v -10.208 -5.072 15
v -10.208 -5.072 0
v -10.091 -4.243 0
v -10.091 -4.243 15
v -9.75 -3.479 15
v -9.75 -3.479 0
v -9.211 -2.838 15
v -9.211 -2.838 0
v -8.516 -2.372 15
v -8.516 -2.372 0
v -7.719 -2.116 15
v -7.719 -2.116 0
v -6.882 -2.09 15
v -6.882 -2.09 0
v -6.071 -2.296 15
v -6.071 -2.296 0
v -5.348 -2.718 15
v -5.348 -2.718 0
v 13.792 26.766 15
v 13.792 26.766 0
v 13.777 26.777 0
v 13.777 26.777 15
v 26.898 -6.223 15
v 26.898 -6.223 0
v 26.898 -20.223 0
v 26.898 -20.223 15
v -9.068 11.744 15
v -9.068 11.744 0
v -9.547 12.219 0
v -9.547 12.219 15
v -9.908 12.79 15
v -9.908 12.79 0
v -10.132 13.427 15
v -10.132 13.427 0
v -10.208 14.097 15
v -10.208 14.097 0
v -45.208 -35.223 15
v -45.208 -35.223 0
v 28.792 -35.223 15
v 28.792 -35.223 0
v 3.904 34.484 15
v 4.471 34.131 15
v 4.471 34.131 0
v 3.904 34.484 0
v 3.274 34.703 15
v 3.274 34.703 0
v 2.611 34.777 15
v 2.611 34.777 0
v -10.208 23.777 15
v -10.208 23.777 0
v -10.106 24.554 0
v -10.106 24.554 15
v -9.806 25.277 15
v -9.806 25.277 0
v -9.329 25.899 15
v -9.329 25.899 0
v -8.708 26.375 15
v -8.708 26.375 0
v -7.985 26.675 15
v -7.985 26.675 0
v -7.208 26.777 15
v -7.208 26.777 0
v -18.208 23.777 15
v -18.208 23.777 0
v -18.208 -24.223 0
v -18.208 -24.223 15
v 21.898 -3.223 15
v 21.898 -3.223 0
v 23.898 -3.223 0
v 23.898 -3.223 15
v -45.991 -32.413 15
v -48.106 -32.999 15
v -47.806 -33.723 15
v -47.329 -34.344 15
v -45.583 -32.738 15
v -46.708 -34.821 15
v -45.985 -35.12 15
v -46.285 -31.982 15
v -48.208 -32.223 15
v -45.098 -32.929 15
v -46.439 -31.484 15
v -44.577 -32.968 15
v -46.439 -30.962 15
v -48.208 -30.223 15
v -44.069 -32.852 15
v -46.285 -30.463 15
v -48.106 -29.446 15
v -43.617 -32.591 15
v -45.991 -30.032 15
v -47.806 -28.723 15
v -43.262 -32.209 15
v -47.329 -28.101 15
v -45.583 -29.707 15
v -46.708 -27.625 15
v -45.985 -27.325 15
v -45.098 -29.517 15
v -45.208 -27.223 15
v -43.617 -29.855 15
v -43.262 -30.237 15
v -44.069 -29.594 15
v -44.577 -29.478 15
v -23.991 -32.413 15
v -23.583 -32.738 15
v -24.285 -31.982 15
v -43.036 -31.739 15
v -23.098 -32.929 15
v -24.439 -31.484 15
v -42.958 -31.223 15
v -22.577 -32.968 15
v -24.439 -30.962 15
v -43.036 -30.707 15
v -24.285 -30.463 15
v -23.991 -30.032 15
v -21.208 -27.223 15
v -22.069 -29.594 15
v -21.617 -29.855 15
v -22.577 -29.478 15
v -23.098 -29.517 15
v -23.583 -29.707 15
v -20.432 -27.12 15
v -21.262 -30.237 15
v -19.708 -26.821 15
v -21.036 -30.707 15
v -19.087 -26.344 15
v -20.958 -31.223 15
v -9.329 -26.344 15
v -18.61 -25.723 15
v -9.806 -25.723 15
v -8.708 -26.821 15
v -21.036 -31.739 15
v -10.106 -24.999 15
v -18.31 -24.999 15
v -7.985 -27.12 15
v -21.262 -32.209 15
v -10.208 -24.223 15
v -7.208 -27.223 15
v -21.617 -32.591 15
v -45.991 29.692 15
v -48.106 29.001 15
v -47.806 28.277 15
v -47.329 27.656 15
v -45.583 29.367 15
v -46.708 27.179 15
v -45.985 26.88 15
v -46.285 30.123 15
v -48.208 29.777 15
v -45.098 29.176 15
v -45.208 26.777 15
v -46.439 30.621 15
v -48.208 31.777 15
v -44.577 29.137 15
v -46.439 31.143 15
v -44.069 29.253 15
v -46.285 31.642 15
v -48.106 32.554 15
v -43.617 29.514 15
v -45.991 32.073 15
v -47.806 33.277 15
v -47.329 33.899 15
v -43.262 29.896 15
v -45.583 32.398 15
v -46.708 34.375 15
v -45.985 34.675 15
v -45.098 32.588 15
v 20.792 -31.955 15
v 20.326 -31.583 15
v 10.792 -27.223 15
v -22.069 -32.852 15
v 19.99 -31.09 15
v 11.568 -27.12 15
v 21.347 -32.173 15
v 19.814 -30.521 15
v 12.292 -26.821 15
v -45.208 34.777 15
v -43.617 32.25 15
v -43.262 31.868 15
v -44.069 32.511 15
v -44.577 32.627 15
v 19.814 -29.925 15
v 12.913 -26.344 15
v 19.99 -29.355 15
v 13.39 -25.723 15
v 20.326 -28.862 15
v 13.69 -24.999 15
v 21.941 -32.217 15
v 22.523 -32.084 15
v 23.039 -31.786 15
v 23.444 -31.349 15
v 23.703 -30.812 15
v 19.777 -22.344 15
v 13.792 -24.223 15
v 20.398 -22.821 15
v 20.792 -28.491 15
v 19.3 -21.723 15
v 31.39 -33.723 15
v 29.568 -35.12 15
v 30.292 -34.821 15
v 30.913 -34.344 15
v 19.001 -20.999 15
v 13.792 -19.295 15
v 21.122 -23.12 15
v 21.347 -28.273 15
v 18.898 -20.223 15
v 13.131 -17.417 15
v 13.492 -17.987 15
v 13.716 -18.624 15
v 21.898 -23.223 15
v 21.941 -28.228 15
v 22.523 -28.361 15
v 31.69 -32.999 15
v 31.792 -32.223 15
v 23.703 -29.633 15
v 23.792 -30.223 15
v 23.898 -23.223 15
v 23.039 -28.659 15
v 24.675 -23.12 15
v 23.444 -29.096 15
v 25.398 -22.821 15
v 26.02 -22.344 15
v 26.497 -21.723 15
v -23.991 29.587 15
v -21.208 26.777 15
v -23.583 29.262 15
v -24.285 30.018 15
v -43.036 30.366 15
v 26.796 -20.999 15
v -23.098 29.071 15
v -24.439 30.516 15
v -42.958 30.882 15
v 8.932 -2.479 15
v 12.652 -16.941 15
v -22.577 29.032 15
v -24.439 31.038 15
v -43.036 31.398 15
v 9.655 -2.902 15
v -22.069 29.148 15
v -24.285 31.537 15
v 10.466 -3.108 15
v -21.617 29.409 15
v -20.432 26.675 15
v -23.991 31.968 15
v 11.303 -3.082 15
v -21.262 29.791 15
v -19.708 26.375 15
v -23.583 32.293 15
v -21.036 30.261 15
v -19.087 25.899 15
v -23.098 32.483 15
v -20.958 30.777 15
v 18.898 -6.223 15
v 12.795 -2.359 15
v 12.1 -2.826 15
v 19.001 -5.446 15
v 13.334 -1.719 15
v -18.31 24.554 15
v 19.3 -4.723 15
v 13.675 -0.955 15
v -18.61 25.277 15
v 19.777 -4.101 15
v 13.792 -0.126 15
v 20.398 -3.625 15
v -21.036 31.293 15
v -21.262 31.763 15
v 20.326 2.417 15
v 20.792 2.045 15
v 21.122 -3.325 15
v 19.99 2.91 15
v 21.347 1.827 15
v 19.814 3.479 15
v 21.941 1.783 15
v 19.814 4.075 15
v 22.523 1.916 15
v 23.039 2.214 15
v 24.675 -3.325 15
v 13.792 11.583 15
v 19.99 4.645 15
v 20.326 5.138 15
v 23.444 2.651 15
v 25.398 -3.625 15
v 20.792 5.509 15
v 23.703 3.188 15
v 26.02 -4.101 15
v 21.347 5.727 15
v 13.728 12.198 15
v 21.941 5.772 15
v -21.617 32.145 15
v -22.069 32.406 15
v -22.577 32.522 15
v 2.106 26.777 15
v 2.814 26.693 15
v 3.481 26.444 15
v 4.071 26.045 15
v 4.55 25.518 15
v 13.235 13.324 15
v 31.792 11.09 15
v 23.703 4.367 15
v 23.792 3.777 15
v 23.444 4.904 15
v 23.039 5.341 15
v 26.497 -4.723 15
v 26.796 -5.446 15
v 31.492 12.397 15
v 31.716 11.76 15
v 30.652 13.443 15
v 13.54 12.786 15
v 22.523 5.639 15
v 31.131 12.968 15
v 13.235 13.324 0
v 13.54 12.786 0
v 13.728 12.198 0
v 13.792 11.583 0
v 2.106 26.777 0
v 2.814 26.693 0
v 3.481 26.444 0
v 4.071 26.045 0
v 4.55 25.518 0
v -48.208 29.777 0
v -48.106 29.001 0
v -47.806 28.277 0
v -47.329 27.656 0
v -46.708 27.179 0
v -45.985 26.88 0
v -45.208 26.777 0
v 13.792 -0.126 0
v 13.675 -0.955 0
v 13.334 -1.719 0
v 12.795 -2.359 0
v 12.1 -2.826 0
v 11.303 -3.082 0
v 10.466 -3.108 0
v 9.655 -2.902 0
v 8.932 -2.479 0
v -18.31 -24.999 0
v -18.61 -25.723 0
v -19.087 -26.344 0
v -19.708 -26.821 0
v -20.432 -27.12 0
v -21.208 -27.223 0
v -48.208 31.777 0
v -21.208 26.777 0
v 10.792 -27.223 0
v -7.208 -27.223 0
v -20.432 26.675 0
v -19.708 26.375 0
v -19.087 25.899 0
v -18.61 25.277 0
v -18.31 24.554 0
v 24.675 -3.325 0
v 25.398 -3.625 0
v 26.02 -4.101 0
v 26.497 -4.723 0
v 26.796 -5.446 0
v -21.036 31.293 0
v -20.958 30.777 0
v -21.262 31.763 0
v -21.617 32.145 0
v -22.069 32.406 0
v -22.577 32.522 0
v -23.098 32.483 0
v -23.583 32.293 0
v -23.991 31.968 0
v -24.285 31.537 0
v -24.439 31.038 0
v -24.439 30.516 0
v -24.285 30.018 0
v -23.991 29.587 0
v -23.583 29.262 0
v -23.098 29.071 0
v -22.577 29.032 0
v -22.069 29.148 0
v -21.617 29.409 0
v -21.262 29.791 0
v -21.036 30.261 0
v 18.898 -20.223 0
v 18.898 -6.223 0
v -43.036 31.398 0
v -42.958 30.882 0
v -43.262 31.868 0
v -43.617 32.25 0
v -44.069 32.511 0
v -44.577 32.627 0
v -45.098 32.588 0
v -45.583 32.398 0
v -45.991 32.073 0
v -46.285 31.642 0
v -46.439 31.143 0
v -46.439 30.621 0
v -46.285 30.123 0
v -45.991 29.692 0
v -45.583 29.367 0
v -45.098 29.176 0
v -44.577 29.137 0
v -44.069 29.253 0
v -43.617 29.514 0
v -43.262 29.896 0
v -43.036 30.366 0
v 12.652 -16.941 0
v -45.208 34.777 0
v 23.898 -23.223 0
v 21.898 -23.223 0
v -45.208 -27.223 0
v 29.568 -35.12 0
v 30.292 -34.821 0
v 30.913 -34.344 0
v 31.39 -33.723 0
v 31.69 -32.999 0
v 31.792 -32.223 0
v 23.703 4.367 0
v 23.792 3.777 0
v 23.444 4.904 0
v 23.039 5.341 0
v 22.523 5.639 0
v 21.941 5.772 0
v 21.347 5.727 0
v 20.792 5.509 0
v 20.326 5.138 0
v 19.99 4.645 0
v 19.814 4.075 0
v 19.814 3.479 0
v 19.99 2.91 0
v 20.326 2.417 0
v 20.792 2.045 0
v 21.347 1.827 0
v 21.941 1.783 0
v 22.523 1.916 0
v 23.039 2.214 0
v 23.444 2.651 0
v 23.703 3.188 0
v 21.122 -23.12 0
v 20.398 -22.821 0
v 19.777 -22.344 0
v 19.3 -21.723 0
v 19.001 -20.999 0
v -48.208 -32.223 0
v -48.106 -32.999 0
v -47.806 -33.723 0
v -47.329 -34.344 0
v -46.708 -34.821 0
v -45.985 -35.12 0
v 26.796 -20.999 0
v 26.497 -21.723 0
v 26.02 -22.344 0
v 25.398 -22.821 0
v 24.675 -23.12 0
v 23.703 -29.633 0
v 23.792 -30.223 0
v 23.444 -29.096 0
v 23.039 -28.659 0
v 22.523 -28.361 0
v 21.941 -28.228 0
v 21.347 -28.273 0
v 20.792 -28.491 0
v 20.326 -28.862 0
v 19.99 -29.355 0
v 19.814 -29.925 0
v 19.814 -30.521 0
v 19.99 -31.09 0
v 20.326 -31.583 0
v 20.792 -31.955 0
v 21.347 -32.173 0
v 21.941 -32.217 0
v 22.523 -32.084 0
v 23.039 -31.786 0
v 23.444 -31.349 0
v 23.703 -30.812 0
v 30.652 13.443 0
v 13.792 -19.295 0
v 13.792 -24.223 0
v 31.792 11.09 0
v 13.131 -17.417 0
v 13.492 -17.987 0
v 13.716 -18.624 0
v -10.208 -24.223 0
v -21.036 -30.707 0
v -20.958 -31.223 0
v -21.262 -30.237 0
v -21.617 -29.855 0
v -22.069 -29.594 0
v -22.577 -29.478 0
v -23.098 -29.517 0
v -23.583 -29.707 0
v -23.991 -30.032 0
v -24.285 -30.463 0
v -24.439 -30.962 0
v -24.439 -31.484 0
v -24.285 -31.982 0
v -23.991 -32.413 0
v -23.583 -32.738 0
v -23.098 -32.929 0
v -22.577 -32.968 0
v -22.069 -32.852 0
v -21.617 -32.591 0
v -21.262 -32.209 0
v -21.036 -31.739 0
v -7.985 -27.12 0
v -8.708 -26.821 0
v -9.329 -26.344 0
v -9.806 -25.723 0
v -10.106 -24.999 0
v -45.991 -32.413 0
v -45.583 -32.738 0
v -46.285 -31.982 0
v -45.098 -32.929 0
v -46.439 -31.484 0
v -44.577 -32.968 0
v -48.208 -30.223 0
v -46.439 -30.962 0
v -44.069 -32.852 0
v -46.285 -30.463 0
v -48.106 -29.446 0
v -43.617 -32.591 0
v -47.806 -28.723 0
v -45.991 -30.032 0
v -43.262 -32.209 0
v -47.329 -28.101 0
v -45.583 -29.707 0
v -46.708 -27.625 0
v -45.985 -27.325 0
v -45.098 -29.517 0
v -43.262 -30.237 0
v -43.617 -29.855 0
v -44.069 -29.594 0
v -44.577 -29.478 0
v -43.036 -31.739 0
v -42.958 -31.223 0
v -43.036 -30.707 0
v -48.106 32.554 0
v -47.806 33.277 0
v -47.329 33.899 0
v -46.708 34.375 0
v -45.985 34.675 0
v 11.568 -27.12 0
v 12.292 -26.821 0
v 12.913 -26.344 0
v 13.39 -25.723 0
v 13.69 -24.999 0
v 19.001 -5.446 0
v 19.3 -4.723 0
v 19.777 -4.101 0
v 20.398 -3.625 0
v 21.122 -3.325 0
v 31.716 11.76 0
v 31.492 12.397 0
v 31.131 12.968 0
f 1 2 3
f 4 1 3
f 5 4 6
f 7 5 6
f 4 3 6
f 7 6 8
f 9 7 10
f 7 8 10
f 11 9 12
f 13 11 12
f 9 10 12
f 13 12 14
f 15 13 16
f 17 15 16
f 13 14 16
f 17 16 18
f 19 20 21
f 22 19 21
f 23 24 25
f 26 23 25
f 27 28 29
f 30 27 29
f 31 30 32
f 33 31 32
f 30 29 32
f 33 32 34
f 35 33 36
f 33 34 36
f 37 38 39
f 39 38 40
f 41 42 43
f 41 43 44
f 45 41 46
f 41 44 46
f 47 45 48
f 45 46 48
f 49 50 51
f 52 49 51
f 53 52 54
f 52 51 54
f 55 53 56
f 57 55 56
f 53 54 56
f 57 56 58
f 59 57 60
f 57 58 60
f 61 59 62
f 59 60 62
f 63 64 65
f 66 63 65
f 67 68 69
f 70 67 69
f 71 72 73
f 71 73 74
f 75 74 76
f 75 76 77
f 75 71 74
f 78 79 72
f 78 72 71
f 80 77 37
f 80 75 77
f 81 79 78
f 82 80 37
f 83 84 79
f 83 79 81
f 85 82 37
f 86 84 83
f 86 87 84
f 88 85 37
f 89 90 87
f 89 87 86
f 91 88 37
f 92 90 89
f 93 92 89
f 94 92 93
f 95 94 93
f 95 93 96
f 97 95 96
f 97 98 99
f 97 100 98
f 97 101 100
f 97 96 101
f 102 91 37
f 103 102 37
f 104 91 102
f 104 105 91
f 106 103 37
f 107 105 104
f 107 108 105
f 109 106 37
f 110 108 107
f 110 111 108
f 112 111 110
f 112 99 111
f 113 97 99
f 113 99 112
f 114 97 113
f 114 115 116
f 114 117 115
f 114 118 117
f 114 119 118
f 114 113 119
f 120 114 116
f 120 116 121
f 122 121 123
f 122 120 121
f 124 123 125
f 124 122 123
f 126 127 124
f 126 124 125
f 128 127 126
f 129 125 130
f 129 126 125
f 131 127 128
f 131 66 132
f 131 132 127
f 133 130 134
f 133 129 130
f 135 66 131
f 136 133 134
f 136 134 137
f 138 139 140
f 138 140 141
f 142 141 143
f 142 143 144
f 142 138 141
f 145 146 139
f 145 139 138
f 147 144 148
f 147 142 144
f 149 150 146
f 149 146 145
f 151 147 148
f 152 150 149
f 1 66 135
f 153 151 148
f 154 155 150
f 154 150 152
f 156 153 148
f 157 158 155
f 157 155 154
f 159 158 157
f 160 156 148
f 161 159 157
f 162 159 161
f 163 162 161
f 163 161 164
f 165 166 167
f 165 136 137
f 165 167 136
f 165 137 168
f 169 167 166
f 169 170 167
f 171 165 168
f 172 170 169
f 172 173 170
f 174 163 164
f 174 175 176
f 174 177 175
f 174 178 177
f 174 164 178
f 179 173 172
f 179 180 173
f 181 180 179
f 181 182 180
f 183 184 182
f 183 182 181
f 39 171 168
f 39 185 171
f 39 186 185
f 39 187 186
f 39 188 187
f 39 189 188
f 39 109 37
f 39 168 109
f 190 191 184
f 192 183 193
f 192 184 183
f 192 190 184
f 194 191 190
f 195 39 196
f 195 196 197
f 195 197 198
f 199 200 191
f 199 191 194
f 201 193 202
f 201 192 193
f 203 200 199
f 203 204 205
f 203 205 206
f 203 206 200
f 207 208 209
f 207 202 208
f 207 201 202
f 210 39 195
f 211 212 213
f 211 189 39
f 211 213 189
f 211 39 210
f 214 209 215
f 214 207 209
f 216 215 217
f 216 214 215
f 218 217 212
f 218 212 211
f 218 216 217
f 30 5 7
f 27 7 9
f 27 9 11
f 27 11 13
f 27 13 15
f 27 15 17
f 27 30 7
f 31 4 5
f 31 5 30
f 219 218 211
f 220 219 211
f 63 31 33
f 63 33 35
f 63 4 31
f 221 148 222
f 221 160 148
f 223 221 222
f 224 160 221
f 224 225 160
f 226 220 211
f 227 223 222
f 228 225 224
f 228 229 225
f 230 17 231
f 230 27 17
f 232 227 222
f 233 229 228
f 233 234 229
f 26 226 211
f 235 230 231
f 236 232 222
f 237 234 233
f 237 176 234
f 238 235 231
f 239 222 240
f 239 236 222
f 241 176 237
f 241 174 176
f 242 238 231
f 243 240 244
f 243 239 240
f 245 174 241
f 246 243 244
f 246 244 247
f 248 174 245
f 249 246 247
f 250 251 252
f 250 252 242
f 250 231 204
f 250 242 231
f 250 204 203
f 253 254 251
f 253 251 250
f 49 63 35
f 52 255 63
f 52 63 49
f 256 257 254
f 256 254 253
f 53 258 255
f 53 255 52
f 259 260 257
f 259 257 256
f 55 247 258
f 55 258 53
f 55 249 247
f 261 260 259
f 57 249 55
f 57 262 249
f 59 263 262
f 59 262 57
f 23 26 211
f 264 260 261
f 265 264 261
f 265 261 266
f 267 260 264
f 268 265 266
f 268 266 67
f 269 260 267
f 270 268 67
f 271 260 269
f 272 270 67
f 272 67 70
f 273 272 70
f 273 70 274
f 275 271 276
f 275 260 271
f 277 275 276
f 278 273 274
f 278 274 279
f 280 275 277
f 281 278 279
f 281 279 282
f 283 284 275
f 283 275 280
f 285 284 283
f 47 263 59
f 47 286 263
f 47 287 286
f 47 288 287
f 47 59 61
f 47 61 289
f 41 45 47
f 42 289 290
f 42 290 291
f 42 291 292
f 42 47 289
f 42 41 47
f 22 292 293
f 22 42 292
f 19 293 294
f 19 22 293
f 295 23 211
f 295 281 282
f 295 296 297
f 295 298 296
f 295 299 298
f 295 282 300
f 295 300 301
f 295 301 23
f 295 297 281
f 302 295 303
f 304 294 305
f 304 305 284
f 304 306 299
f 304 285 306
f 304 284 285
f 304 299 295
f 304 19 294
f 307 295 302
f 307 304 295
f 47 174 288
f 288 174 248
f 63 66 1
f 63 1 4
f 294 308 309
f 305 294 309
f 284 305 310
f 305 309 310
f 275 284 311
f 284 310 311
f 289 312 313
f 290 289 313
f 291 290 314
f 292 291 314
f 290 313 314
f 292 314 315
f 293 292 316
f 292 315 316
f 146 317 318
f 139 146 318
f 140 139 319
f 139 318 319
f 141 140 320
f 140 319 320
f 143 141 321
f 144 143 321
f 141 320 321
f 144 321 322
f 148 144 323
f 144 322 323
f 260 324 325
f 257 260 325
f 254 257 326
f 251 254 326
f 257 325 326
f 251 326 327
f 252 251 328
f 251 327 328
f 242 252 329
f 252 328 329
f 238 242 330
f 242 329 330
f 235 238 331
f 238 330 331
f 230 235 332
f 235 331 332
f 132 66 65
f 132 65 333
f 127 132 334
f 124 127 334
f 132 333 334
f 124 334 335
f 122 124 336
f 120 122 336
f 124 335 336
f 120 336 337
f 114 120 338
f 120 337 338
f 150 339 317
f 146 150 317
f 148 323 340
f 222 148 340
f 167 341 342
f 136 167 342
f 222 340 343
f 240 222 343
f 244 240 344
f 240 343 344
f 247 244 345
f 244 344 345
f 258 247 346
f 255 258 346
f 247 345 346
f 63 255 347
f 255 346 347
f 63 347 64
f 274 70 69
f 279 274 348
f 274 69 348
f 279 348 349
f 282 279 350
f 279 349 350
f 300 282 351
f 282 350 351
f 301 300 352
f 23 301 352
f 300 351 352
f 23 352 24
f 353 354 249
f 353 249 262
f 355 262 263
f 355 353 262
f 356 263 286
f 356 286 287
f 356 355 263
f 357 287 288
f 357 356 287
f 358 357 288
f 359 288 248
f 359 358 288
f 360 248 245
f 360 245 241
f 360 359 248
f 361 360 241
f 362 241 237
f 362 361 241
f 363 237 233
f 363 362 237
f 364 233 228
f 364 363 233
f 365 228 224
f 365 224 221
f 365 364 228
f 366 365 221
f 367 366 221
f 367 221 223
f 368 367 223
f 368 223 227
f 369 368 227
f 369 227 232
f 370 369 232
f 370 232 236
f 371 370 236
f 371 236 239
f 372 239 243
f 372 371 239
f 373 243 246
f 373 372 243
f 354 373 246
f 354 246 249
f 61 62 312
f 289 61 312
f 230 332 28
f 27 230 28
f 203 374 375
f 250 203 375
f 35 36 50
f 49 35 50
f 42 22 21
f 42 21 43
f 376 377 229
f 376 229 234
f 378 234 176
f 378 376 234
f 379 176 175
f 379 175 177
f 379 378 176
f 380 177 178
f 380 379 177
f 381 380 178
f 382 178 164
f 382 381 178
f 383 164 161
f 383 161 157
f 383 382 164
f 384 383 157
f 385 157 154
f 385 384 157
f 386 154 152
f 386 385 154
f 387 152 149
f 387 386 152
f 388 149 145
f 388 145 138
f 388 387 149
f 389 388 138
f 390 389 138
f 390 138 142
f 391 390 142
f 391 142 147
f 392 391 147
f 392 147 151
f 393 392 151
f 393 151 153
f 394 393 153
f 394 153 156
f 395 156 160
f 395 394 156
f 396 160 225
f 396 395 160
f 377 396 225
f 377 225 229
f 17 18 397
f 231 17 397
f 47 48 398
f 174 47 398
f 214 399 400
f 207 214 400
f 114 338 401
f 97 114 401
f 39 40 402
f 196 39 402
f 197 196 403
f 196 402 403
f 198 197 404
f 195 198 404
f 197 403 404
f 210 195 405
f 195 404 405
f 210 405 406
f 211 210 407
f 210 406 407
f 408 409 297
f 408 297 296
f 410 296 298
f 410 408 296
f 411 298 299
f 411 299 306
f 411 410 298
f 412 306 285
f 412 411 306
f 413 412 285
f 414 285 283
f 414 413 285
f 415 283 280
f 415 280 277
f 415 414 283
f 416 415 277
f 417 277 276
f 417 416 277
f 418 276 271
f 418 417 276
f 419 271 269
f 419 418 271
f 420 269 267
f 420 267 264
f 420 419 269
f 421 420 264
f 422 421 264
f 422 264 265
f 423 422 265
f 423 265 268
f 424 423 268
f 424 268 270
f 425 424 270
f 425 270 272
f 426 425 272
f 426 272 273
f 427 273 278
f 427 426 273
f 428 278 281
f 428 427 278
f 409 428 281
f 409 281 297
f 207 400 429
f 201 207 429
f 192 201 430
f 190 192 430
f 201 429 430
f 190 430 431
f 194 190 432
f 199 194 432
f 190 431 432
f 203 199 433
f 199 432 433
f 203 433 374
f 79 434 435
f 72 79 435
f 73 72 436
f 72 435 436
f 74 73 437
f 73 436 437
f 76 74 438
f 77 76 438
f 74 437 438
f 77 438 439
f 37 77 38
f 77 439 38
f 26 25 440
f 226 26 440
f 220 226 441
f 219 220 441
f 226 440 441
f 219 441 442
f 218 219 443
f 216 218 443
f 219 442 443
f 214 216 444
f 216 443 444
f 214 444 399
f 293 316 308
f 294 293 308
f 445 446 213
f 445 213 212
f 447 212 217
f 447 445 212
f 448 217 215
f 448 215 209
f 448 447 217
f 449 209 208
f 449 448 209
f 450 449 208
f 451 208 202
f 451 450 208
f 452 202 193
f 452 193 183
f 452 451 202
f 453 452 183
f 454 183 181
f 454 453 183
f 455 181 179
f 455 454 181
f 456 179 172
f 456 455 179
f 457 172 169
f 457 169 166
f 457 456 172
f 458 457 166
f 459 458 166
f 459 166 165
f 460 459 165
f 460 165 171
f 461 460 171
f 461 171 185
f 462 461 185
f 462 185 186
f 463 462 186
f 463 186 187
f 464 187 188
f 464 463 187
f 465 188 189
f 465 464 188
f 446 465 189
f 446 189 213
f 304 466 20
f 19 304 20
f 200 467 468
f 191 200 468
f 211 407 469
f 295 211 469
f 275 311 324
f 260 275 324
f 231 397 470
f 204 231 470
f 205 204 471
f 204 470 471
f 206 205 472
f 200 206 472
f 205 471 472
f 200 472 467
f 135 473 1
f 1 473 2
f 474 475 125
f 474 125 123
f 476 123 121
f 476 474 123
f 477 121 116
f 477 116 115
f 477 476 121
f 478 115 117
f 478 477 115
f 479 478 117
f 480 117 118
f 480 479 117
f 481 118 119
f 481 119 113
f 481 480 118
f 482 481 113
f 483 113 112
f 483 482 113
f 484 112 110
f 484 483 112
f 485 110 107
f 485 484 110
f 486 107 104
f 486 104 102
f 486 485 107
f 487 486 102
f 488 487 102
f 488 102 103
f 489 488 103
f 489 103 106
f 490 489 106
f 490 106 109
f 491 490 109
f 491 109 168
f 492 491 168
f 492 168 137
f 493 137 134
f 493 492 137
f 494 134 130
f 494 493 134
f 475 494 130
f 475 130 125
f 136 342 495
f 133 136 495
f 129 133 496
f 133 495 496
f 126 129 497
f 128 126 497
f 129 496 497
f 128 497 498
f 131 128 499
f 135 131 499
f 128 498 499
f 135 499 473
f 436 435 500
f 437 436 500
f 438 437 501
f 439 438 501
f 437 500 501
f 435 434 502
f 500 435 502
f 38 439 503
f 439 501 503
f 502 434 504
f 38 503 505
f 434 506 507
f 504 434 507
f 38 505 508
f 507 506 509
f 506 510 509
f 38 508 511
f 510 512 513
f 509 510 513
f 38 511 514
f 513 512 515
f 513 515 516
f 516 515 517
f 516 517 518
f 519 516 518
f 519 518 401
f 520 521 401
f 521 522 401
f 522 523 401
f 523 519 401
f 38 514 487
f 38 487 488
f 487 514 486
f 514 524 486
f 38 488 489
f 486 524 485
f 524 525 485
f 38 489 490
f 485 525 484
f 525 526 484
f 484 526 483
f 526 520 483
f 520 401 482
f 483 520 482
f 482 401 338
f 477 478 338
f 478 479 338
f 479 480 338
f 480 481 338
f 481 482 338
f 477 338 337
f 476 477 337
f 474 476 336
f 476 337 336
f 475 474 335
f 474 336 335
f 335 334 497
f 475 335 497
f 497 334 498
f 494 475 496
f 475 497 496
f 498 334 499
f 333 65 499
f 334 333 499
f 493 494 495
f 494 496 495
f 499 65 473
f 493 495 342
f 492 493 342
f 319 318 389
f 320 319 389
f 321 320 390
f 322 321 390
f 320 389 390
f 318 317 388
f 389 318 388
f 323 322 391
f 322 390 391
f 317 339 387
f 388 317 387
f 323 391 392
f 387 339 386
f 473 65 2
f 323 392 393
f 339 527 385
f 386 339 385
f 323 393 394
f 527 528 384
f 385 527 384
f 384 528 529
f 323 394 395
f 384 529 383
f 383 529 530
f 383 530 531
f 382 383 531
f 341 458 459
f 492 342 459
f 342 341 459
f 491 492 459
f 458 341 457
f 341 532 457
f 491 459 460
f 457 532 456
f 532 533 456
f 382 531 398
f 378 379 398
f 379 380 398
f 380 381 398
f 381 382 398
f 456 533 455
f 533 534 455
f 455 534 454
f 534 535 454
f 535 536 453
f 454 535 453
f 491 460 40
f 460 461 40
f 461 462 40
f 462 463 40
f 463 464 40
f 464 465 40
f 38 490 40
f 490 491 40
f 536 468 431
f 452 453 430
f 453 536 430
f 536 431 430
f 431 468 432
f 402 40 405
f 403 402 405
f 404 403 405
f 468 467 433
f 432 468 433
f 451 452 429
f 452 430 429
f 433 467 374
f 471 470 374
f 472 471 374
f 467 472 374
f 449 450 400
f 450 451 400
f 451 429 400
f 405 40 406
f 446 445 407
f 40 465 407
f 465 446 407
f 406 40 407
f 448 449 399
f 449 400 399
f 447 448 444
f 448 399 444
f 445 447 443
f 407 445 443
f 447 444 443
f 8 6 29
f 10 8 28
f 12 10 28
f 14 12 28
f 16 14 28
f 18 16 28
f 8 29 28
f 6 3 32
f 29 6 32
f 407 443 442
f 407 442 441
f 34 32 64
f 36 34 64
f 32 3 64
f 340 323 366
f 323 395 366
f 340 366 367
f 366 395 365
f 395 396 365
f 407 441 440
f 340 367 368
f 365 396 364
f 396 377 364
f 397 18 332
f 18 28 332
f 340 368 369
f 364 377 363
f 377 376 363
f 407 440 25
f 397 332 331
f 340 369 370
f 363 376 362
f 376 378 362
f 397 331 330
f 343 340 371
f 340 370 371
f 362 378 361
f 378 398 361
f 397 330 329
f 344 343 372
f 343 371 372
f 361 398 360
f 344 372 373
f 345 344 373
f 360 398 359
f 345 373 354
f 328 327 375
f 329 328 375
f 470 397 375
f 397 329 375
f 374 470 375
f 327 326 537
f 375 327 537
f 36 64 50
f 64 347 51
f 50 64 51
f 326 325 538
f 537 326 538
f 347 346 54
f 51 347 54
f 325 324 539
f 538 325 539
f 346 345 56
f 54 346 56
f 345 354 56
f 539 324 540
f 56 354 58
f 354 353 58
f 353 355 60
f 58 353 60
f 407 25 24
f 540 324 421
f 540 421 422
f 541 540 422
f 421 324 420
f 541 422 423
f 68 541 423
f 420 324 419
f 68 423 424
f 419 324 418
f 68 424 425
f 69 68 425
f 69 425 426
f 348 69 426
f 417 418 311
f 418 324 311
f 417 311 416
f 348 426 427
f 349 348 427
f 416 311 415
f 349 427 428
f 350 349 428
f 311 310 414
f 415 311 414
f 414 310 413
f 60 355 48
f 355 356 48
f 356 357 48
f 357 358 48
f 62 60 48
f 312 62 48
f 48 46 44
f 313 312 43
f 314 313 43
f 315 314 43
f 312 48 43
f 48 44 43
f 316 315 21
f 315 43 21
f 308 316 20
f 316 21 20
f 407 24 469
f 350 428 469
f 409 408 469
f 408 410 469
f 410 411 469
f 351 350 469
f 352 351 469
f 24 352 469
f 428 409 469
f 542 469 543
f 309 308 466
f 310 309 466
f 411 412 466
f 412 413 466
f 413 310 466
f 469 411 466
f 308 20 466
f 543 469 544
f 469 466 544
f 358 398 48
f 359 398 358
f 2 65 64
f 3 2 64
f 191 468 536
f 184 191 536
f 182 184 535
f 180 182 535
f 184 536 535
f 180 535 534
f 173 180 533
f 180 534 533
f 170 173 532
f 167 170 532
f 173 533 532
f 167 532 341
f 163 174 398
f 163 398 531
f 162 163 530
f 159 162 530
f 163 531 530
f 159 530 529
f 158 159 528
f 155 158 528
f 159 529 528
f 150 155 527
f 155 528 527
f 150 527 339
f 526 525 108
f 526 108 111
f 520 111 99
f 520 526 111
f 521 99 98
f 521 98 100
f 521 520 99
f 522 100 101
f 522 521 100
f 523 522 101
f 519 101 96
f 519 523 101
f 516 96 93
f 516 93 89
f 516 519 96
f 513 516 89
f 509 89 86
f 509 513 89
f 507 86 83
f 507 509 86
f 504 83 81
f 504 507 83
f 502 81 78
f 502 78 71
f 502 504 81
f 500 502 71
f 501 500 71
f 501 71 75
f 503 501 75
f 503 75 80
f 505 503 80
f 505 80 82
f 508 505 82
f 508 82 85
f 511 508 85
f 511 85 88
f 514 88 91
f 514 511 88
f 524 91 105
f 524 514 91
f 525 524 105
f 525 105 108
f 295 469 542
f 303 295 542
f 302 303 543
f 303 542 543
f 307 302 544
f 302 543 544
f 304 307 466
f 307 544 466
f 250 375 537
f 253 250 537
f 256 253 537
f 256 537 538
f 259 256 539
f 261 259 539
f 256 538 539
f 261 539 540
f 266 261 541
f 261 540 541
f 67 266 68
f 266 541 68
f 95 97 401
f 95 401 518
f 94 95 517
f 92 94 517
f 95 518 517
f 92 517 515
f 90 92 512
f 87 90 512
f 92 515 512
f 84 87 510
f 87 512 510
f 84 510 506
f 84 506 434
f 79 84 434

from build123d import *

# Parameters (mm, degrees)
F0_R     = 1.75
F0_R_2   = 2
F1_DEPTH = 15


with BuildPart() as f1:
    # F0 (on Top) → F1 (new body)
    with BuildSketch(Plane.XY):
        with BuildLine():
            ThreePointArc((4.4705081946, 34.1311327705), (3.5950567719, 34.6111450962), (2.6105643925, 34.7772829339))
            Line((2.6105643925, 34.7772829339), (-45.2081770897, 34.7772829339))
            ThreePointArc((-45.2081770897, 34.7772829339), (-47.3294974333, 33.8986032775), (-48.2081770897, 31.7772829339))
            Line((-48.2081770897, 31.7772829339), (-48.2081770897, 29.7772829339))
            ThreePointArc((-48.2081770897, 29.7772829339), (-47.3294974333, 27.6559625904), (-45.2081770897, 26.7772829339))
            Line((-45.2081770897, 26.7772829339), (-21.2081770897, 26.7772829339))
            ThreePointArc((-21.2081770897, 26.7772829339), (-19.0868567461, 25.8986032775), (-18.2081770897, 23.7772829339))
            Line((-18.2081770897, 23.7772829339), (-18.2081770897, -24.2227170661))
            ThreePointArc((-18.2081770897, -24.2227170661), (-19.0868567461, -26.3440374096), (-21.2081770897, -27.2227170661))
            Line((-21.2081770897, -27.2227170661), (-45.2081770897, -27.2227170661))
            ThreePointArc((-45.2081770897, -27.2227170661), (-47.3294974333, -28.1013967225), (-48.2081770897, -30.2227170661))
            Line((-48.2081770897, -30.2227170661), (-48.2081770897, -32.2227170661))
            ThreePointArc((-48.2081770897, -32.2227170661), (-47.3294974333, -34.3440374096), (-45.2081770897, -35.2227170661))
            Line((-45.2081770897, -35.2227170661), (28.7918229103, -35.2227170661))
            ThreePointArc((28.7918229103, -35.2227170661), (30.9131432539, -34.3440374096), (31.7918229103, -32.2227170661))
            Line((31.7918229103, -32.2227170661), (31.7918229103, 11.0896125673))
            ThreePointArc((31.7918229103, 11.0896125673), (31.4918072997, 12.3973144816), (30.6517667124, 13.4434624038))
            Line((30.6517667124, 13.4434624038), (13.7918229103, 26.7657005056))
            Line((13.7918229103, 26.7657005056), (13.7771647808, 26.7772829339))
            Line((13.7771647808, 26.7772829339), (4.4705081946, 34.1311327705))
        make_face()
        with Locations((-44.7081770897, -31.2227170661)):
            Circle(F0_R, mode=Mode.SUBTRACT)
        with Locations((-22.7081770897, -31.2227170661)):
            Circle(F0_R, mode=Mode.SUBTRACT)
        with Locations((21.7918229103, -30.2227170661)):
            Circle(F0_R_2, mode=Mode.SUBTRACT)
        with BuildLine():
            Line((10.7918229103, -27.2227170661), (-7.2081770897, -27.2227170661))
            ThreePointArc((-7.2081770897, -27.2227170661), (-9.3294974333, -26.3440374096), (-10.2081770897, -24.2227170661))
            Line((-10.2081770897, -24.2227170661), (-10.2081770897, -5.0720059582))
            ThreePointArc((-10.2081770897, -5.0720059582), (-8.5158790041, -2.3720215688), (-5.3482332876, -2.7181561216))
            Line((-5.3482332876, -2.7181561216), (12.6517667124, -16.941233532))
            ThreePointArc((12.6517667124, -16.941233532), (13.4918072997, -17.9873814542), (13.7918229103, -19.2950833685))
            Line((13.7918229103, -19.2950833685), (13.7918229103, -24.2227170661))
            ThreePointArc((13.7918229103, -24.2227170661), (12.9131432539, -26.3440374096), (10.7918229103, -27.2227170661))
        make_face(mode=Mode.SUBTRACT)
        with BuildLine():
            ThreePointArc((18.8984889537, -6.2227170661), (19.7771686101, -4.1013967225), (21.8984889537, -3.2227170661))
            Line((21.8984889537, -3.2227170661), (23.8984889537, -3.2227170661))
            ThreePointArc((23.8984889537, -3.2227170661), (26.0198092973, -4.1013967225), (26.8984889537, -6.2227170661))
            Line((26.8984889537, -6.2227170661), (26.8984889537, -20.2227170661))
            ThreePointArc((26.8984889537, -20.2227170661), (26.0198092973, -22.3440374096), (23.8984889537, -23.2227170661))
            Line((23.8984889537, -23.2227170661), (21.8984889537, -23.2227170661))
            ThreePointArc((21.8984889537, -23.2227170661), (19.7771686101, -22.3440374096), (18.8984889537, -20.2227170661))
            Line((18.8984889537, -20.2227170661), (18.8984889537, -6.2227170661))
        make_face(mode=Mode.SUBTRACT)
        with Locations((-44.7081770897, 30.8822728693)):
            Circle(F0_R, mode=Mode.SUBTRACT)
        with Locations((-22.7081770897, 30.7772829339)):
            Circle(F0_R, mode=Mode.SUBTRACT)
        with BuildLine():
            ThreePointArc((-10.2081770897, 23.7772829339), (-9.3294974333, 25.8986032775), (-7.2081770897, 26.7772829339))
            Line((-7.2081770897, 26.7772829339), (2.1063956214, 26.7772829339))
            ThreePointArc((2.1063956214, 26.7772829339), (3.4809139878, 26.4438723774), (4.5499130653, 25.5177491075))
            Line((4.5499130653, 25.5177491075), (13.2353403542, 13.3238935696))
            ThreePointArc((13.2353403542, 13.3238935696), (13.6493176462, 12.4970596164), (13.7918229103, 11.583427396))
            Line((13.7918229103, 11.583427396), (13.7918229103, -0.1256085036))
            ThreePointArc((13.7918229103, -0.1256085036), (12.0995248247, -2.825592893), (8.9318791082, -2.4794583402))
            Line((8.9318791082, -2.4794583402), (-9.0681208918, 11.7436190702))
            ThreePointArc((-9.0681208918, 11.7436190702), (-9.9081614791, 12.7897669924), (-10.2081770897, 14.0974689067))
            Line((-10.2081770897, 14.0974689067), (-10.2081770897, 23.7772829339))
        make_face(mode=Mode.SUBTRACT)
        with Locations((21.7918229103, 3.7772829339)):
            Circle(F0_R_2, mode=Mode.SUBTRACT)
    extrude(amount=F1_DEPTH)


solid = f1.part
